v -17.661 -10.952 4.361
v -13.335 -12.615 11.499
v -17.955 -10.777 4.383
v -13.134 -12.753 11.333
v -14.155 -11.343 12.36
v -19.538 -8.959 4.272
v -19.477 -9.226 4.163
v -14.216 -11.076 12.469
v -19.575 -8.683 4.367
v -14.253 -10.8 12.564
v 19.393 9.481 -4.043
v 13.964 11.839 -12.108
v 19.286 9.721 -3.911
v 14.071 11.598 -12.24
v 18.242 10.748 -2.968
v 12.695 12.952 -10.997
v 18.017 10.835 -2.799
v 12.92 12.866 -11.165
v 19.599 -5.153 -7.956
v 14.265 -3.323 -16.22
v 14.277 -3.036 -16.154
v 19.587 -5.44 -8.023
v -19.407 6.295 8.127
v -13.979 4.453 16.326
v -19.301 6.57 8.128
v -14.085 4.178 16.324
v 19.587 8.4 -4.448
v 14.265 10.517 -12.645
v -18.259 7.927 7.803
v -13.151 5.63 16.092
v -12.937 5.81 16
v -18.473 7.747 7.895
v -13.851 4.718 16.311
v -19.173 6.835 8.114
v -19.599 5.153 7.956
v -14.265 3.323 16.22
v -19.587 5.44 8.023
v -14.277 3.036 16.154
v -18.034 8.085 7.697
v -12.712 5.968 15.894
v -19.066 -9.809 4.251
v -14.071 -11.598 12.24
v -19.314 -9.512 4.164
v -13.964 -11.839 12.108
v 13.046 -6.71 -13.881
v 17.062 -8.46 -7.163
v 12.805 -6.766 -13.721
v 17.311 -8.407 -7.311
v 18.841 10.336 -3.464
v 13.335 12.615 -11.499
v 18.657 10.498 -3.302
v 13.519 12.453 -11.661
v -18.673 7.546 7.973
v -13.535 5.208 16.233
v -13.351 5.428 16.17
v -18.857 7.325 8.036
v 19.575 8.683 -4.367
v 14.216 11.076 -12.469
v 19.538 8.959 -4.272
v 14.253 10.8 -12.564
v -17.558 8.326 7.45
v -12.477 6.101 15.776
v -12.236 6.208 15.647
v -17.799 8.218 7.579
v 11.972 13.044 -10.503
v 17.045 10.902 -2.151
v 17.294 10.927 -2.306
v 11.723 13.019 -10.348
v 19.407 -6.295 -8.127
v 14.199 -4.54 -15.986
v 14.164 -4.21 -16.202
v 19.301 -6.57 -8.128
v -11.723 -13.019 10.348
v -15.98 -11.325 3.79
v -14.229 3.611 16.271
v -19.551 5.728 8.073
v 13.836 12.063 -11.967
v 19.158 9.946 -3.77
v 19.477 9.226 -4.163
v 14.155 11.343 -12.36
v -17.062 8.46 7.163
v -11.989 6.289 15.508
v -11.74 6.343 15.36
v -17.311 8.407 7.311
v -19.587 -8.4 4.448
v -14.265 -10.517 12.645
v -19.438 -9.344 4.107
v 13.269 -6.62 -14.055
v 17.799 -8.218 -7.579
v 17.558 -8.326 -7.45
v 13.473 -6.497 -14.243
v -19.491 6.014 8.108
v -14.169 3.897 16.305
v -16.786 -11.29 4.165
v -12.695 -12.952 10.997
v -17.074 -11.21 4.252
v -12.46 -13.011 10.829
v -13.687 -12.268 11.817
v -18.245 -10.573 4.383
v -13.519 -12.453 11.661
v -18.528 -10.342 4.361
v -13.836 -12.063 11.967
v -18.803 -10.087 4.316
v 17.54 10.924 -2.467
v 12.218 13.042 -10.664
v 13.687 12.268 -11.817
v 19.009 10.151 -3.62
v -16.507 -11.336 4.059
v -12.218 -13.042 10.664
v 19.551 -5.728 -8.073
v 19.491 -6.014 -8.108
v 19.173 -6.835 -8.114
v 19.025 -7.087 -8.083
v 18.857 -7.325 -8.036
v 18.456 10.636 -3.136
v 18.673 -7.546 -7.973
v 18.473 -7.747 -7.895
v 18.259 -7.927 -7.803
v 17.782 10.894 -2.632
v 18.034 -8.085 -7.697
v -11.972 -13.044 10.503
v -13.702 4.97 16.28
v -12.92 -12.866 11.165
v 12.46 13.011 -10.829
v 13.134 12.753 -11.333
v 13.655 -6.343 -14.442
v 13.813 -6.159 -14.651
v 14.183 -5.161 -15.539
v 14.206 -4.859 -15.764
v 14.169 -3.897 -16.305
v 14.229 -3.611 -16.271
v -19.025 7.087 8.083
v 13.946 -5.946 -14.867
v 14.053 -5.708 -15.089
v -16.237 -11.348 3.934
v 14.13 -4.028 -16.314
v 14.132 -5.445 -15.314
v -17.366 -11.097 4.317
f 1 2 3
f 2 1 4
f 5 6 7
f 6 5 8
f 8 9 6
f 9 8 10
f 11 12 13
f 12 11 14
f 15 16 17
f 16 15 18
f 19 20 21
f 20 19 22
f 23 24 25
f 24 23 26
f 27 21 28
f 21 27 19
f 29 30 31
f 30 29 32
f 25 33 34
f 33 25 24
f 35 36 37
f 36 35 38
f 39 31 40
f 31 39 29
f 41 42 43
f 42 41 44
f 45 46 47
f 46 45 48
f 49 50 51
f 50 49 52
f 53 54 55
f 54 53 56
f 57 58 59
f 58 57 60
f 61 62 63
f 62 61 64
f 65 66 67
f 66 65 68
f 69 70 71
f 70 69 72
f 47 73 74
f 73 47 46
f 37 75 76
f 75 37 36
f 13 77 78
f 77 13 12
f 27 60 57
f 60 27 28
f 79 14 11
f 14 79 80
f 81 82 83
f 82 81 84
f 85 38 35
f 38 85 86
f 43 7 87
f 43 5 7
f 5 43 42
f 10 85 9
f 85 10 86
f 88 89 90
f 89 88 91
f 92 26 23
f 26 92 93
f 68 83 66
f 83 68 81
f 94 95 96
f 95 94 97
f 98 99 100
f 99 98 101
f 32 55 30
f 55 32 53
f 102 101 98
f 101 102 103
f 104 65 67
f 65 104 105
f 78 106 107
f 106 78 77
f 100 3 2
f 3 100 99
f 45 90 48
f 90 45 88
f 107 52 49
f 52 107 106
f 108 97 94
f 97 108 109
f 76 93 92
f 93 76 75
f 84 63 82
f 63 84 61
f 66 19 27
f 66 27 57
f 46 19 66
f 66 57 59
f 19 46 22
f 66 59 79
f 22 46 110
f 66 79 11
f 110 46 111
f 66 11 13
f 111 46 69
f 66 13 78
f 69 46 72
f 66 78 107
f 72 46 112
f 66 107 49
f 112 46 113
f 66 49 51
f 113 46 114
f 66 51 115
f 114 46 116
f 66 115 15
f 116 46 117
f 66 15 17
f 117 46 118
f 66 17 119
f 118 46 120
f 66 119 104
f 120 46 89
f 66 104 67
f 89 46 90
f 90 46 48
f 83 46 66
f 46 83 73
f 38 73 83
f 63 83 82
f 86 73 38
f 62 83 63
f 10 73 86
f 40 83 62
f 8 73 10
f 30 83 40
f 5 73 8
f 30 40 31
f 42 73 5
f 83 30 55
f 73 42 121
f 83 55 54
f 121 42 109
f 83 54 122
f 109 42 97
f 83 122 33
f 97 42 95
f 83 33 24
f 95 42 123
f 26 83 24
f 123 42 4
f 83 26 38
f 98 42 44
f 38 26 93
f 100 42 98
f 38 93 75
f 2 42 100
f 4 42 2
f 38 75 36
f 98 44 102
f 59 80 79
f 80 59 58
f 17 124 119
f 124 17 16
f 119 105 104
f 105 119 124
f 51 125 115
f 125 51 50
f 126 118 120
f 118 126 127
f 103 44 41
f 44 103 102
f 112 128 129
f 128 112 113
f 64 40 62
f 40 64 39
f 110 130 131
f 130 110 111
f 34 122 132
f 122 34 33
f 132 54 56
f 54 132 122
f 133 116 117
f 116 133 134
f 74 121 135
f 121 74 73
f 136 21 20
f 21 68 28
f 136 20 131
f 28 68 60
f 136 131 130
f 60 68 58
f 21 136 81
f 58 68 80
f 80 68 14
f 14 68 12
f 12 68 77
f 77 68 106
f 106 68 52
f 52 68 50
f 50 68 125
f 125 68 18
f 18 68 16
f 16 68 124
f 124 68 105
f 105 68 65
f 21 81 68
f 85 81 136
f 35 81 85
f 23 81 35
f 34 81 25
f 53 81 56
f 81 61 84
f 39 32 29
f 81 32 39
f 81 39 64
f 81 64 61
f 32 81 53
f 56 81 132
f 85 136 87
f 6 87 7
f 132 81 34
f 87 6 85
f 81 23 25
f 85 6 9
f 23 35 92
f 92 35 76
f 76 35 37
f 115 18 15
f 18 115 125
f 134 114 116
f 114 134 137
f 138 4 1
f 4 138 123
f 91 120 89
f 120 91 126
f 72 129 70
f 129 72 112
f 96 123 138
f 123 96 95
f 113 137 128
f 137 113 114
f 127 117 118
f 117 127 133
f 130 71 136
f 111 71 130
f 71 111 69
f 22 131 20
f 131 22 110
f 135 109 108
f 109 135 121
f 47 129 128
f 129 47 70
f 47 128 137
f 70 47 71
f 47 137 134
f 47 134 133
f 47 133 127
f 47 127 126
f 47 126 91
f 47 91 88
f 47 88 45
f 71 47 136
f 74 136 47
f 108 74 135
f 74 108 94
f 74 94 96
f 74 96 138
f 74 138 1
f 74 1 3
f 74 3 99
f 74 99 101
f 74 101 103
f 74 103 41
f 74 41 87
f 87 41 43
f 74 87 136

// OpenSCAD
// file: clipped_arc_plate.scad
// The bottom-front cutter crosses both front XY corner arcs.
$fn = 64;
body_length = 40;
body_width = 20;
body_height = 10;
corner_1_radius = 3;
corner_2_radius = 3;
corner_3_radius = 3;
corner_4_radius = 3;
chamfer_1_width = 2;

module clipped_arc_plate(body_length=40, body_width=20, body_height=10,
                          corner_1_radius=3, corner_2_radius=3,
                          corner_3_radius=3, corner_4_radius=3, chamfer_1_width=2) {
    r1=corner_1_radius; r2=corner_2_radius;
    r3=corner_3_radius; r4=corner_4_radius;
    assert(min(body_length,body_width,body_height,r1,r2,r3,r4,chamfer_1_width)>0);
    assert(2*max(r1,r2,r3,r4)<min(body_length,body_width));
    assert(chamfer_1_width<min(body_width,body_height));
    difference() {
        linear_extrude(height=body_height) hull() {
            translate([r1,r1]) circle(r=r1);
            translate([body_length-r2,r2]) circle(r=r2);
            translate([body_length-r3,body_width-r3]) circle(r=r3);
            translate([r4,body_width-r4]) circle(r=r4);
        }
        multmatrix([[0,0,1,-1],[1,0,0,0],[0,1,0,0],[0,0,0,1]])
            linear_extrude(height=body_length+2)
                polygon([[0,0],[chamfer_1_width,0],[0,chamfer_1_width]]);
    }
}

clipped_arc_plate(body_length,body_width,body_height,corner_1_radius,
    corner_2_radius,corner_3_radius,corner_4_radius,chamfer_1_width);
// main file
use <clipped_arc_plate.scad>
$fn = 16;
body_length = 40;
body_width = 20;
body_height = 10;
corner_1_radius = 3;
corner_2_radius = 3;
corner_3_radius = 3;
corner_4_radius = 3;
chamfer_1_width = 2;

rotate([17,31,9]) translate([-body_length/2,-body_width/2,-body_height/2])
    clipped_arc_plate(body_length,body_width,body_height,corner_1_radius,
        corner_2_radius,corner_3_radius,corner_4_radius,chamfer_1_width);
